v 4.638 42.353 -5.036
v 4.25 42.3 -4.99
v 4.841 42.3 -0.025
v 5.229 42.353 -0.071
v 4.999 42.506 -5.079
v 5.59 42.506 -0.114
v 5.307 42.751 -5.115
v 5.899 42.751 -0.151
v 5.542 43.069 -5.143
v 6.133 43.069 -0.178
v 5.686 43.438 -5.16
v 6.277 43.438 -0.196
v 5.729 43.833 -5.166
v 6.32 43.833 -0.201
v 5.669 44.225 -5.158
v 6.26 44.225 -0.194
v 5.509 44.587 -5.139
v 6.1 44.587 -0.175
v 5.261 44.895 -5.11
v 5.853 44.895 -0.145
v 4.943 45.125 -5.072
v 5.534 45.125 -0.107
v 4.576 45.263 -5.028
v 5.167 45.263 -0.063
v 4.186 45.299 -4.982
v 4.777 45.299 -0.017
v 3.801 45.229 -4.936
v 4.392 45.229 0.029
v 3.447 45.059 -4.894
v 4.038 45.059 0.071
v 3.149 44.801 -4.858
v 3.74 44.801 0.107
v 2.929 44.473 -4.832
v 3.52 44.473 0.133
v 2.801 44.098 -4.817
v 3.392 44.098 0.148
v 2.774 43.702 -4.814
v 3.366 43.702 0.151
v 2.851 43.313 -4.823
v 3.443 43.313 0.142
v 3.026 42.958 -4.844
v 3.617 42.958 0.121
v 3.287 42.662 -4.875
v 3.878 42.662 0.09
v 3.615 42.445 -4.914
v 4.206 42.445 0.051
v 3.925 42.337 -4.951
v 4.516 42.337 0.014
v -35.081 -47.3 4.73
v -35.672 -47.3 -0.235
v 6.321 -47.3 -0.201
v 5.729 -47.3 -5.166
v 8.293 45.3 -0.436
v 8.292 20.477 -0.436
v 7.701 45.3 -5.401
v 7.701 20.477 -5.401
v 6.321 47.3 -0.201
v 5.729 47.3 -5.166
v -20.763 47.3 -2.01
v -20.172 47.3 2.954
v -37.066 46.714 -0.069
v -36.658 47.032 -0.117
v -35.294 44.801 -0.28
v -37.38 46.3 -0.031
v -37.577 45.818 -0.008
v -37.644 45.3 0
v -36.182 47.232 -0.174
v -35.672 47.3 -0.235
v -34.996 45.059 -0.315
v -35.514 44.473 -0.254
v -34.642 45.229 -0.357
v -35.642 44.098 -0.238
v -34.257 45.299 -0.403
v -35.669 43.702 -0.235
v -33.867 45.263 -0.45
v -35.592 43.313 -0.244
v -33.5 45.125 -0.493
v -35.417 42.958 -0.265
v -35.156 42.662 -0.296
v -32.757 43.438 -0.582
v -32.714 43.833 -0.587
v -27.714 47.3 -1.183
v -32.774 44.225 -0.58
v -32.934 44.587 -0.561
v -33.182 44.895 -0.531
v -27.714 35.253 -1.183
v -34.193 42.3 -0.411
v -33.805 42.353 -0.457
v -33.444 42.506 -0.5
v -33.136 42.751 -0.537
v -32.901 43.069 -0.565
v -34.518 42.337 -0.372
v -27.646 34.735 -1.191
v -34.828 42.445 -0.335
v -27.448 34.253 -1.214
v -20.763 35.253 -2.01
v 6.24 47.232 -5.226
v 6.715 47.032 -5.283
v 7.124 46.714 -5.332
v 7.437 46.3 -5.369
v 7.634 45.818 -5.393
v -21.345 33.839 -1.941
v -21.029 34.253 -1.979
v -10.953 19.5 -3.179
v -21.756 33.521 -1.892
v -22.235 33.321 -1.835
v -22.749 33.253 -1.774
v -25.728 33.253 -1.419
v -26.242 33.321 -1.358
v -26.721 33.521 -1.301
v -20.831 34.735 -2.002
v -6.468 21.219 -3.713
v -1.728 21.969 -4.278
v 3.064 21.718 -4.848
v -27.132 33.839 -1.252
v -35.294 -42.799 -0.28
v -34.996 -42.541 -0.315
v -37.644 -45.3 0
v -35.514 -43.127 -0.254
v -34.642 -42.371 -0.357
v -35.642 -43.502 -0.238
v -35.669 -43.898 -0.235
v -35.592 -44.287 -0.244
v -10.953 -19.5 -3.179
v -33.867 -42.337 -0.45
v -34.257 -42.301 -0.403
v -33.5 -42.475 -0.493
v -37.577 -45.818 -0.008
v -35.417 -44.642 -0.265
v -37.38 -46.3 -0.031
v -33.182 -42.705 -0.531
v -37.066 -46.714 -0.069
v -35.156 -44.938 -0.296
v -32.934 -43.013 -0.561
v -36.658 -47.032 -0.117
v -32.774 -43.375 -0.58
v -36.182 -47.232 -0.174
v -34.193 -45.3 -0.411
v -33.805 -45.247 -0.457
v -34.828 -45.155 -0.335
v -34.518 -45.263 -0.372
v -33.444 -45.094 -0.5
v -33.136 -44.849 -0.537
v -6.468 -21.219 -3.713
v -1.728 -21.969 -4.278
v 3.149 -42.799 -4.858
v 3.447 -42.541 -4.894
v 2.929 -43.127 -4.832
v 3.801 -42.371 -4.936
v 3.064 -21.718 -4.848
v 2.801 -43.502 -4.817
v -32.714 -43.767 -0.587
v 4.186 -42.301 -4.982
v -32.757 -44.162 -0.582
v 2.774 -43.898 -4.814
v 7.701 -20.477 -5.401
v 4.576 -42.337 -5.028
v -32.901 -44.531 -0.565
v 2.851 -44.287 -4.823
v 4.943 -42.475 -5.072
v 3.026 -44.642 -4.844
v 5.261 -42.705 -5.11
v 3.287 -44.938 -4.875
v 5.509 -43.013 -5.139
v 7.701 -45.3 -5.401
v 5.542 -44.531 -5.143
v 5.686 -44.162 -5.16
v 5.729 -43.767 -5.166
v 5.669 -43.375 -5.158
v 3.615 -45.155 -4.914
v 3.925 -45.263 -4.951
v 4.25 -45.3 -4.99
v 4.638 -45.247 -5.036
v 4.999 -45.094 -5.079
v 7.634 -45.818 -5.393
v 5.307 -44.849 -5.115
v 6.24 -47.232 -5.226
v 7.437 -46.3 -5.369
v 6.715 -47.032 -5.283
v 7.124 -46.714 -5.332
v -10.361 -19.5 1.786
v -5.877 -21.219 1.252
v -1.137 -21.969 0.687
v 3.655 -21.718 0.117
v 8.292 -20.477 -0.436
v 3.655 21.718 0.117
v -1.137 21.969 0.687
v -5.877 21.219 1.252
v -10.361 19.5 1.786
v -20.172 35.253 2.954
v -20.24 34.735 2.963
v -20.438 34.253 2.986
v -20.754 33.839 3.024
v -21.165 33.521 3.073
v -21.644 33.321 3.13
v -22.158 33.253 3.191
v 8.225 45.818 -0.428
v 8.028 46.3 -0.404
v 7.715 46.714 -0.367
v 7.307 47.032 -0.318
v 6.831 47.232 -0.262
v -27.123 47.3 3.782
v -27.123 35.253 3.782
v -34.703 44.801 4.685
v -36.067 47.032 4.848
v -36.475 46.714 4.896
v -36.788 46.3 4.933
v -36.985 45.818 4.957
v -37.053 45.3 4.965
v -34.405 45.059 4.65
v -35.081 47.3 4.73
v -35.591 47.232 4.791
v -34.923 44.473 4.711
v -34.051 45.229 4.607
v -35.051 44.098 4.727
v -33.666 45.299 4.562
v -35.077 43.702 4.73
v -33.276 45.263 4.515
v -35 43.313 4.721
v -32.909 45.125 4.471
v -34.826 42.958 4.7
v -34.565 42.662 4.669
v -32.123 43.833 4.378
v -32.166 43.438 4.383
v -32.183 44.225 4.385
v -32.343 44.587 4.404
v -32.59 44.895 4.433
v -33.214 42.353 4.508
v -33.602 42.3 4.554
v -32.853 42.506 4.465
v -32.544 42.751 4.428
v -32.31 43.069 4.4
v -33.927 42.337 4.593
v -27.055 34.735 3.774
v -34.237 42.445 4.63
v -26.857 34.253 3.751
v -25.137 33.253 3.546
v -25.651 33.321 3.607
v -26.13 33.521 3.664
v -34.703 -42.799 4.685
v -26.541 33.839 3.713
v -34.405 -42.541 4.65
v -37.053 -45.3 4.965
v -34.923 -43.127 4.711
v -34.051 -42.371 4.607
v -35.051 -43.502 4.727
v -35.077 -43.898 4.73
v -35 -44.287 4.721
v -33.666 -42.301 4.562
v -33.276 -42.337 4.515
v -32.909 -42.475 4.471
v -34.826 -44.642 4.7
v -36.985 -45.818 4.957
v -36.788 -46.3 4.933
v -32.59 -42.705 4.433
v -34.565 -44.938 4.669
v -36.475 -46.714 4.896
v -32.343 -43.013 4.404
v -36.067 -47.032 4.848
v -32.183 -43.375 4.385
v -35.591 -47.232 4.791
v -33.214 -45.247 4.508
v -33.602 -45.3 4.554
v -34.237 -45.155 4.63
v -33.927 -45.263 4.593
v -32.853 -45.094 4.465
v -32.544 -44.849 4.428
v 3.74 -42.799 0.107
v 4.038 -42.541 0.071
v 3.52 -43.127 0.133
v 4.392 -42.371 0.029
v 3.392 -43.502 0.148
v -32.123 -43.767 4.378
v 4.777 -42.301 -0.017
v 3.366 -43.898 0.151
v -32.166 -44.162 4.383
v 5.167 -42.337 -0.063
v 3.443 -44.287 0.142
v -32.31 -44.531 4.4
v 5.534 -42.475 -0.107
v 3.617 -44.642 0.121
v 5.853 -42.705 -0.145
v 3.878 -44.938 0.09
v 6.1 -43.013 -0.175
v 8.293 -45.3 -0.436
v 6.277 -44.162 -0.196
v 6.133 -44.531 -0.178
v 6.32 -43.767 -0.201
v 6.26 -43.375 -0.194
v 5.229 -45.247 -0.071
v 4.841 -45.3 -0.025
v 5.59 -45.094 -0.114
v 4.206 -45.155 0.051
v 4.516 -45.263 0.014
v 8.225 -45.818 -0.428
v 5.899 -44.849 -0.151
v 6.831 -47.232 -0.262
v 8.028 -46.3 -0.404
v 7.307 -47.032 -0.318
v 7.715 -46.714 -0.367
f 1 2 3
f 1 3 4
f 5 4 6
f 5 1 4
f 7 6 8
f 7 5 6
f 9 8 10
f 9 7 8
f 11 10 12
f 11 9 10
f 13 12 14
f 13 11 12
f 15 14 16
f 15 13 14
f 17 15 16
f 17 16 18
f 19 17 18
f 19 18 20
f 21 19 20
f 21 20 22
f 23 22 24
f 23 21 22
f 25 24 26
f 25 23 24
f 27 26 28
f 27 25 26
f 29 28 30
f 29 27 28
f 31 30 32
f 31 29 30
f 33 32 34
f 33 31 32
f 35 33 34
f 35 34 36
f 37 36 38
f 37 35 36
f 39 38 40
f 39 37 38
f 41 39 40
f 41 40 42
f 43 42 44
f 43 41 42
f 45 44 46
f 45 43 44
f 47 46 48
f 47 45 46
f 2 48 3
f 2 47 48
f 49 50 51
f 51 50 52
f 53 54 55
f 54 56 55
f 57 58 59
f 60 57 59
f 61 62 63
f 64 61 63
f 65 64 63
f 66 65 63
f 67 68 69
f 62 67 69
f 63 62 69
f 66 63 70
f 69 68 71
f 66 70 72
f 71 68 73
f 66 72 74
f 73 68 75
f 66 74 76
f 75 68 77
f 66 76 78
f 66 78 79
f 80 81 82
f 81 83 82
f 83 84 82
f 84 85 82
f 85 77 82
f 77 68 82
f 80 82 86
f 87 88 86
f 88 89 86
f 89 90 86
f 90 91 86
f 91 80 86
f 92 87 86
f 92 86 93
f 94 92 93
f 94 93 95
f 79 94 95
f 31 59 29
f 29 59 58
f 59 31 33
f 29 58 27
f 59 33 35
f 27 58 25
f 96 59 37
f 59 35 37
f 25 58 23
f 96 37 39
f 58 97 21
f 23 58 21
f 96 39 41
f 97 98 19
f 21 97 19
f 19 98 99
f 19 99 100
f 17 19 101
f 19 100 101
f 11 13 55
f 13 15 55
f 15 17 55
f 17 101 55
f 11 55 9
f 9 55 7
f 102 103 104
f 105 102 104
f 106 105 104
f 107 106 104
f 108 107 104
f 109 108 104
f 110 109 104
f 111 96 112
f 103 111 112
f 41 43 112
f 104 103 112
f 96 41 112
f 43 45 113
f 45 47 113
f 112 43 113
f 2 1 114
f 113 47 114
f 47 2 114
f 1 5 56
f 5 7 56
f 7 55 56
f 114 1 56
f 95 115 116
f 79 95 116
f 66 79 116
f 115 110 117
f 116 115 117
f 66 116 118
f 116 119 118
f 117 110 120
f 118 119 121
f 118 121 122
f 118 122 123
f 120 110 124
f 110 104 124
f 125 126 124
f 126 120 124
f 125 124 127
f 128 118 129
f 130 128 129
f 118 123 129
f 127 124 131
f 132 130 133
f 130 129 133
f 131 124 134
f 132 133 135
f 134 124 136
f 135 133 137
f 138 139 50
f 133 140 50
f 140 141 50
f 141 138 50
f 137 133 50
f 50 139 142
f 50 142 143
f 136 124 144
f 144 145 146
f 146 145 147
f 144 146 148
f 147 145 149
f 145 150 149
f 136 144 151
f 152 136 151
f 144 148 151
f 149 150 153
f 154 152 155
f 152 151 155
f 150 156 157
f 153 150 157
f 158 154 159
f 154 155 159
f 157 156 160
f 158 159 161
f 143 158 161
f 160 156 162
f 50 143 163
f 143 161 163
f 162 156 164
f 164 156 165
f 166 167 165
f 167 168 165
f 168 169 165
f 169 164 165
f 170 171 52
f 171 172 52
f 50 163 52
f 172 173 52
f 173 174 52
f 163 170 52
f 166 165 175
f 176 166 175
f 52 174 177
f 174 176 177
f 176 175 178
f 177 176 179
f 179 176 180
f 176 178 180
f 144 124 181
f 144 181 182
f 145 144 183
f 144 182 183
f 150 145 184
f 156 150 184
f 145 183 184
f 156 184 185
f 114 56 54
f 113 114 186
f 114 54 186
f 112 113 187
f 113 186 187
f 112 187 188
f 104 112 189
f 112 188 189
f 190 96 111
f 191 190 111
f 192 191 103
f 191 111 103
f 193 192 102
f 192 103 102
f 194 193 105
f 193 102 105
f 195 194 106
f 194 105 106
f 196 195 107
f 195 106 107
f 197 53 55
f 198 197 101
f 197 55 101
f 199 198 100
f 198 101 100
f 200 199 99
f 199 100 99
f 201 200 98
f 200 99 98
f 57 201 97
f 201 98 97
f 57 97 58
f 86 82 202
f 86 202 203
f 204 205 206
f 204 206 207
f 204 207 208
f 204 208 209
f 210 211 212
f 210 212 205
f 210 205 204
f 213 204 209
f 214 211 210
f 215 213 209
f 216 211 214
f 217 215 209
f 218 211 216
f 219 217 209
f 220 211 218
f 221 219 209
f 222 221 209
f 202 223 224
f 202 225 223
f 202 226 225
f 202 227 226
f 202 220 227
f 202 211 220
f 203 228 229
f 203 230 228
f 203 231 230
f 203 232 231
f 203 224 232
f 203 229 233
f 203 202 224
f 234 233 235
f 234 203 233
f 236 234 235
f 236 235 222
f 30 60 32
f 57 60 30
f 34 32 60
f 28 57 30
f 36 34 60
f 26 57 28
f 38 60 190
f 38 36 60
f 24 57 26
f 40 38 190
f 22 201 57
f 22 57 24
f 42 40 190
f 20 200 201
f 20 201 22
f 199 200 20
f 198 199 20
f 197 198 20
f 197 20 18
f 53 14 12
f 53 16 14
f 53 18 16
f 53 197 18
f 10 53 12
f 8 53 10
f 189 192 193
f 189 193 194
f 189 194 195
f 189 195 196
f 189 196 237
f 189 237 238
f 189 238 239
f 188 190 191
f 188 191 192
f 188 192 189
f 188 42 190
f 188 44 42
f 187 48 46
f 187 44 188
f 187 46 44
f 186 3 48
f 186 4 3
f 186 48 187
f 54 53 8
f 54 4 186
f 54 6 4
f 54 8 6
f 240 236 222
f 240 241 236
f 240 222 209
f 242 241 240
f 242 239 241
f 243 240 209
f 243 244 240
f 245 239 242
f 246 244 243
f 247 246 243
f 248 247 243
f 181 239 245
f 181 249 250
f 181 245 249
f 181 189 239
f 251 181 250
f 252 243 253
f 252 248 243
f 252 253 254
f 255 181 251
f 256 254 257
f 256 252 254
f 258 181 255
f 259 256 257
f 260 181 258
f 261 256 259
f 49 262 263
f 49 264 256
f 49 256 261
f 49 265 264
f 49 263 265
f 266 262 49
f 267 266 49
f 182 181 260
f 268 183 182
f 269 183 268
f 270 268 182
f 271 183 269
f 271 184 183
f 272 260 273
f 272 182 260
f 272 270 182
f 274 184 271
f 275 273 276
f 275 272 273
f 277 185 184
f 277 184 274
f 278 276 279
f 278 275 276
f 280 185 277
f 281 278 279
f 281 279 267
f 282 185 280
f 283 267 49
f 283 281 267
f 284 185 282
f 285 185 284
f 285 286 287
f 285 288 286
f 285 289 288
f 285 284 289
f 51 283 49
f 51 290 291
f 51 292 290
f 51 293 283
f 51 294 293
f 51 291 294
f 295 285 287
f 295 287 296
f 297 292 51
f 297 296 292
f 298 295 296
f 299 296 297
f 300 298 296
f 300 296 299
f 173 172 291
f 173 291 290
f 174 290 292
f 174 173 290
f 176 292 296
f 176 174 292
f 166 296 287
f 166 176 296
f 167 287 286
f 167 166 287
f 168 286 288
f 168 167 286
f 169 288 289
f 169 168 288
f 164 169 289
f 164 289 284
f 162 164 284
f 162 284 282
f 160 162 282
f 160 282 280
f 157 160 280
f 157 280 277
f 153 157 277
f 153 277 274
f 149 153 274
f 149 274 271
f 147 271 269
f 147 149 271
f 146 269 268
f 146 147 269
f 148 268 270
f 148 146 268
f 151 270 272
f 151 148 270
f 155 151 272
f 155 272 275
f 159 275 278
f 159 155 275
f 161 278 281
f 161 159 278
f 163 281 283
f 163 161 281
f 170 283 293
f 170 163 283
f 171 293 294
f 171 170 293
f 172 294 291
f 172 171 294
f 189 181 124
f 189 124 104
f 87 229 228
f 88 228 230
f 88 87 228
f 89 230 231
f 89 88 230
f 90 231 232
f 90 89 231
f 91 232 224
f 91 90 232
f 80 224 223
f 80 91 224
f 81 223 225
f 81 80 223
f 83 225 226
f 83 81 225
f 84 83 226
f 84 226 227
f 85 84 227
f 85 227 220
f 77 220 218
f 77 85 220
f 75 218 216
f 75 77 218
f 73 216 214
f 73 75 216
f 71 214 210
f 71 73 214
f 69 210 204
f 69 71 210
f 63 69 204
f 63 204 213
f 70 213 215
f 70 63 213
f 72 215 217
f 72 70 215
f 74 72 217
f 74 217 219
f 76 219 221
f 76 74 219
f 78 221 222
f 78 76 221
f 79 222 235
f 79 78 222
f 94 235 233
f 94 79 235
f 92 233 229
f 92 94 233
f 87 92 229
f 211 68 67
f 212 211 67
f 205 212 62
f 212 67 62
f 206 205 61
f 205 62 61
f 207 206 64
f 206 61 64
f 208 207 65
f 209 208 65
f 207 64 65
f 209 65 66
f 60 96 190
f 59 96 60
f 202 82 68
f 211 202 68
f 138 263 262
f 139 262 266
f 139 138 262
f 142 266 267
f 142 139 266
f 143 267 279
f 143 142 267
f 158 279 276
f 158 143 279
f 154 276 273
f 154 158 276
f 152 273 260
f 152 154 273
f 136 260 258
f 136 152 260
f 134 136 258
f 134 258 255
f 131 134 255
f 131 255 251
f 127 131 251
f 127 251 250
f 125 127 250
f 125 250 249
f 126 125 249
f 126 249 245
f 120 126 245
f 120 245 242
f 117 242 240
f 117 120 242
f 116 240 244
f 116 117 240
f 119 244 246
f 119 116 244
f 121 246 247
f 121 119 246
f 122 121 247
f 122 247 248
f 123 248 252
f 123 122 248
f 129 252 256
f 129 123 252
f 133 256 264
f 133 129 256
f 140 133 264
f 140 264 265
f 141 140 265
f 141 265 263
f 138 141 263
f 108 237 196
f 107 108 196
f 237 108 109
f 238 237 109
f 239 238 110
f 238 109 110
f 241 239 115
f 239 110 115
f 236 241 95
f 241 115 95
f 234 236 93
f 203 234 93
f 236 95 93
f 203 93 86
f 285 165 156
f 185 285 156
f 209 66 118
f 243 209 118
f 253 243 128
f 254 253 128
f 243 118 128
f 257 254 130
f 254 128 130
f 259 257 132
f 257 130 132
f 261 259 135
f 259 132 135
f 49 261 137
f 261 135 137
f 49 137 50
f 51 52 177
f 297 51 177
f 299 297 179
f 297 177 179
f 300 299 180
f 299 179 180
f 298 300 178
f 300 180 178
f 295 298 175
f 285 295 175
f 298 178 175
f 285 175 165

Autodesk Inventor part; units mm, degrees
ref_plane "YZ Plane" through (0, 0, 0) normal (1, 0, 0) x (0, 1, 0)
ref_plane "XZ Plane" through (0, 0, 0) normal (0, 1, 0) x (-1, 0, 0)
ref_plane "XY Plane" through (0, 0, 0) normal (0, 0, 1) x (1, 0, 0)
ref_plane "Work Plane1" through (-27.4782, 47.3, -1.2107) normal (0.118263, 0, 0.9929823) x (0, -1, 0)
sketch "Sketch1" plane through (-27.4782, 47.3, -1.2107) normal (0.118263, 0, 0.9929823) x (0, -1, 0)
  line L0 (0, 33.4421) -> (0, -8.2516) projected
  line L1 (2, -10.2376) -> (92.6, -10.2376) projected
  line L2 (94.6, -8.2516) -> (94.6, 33.4421) projected
  line L3 (92.6, 35.428) -> (2, 35.428) projected
  line L4 (7, -3.2867) -> (7, 28.4771) projected
  line L5 (7, 28.4771) -> (87.6, 28.4771) projected
  line L6 (87.6, 28.4771) -> (87.6, -3.2867) projected
  line L7 (87.6, -3.2867) -> (7, -3.2867) projected
  ellipse E0 centre (2, 33.4421) end of major axis (4, 33.4421) minor radius 1.986 (2, 35.428) -> (0, 33.4421) ccw projected
  ellipse E1 centre (2, -8.2516) end of major axis (0, -8.2516) minor radius 1.986 (0, -8.2516) -> (2, -10.2376) ccw projected
  ellipse E2 centre (92.6, -8.2516) end of major axis (90.6, -8.2516) minor radius 1.986 (92.6, -10.2376) -> (94.6, -8.2516) ccw projected
  ellipse E3 centre (92.6, 33.4421) end of major axis (94.6, 33.4421) minor radius 1.986 (94.6, 33.4421) -> (92.6, 35.428) ccw projected
  ellipse E4 centre (91.1, -6.7621) end of major axis (92.6, -6.7621) minor radius 1.4895 projected
  ellipse E5 centre (3.5, -6.7621) end of major axis (5, -6.7621) minor radius 1.4895 projected
  ellipse E6 centre (91.1, 31.9526) end of major axis (92.6, 31.9526) minor radius 1.4895 projected
  ellipse E7 centre (3.5, 31.9526) end of major axis (5, 31.9526) minor radius 1.4895 projected
  point P0 (47.3, 27.1422)
extrude "Extrusion1" add sketch "Sketch1" along normal blind 5 contours E0 L3 E3 L2 E2 L1 E1 L0 | L4 L5 L6 L7
sketch "Sketch2" plane through (-26.8869, 47.3, 3.7542) normal (0.118263, 0, 0.9929823) x (0.9929823, 0, -0.118263)
  line L0 (16.6422, -25.3) -> (37.6422, -25.3)
  line L1 (37.6422, -25.3) -> (37.6422, -69.3)
  line L2 (37.6422, -69.3) -> (16.6422, -69.3)
  line L3 (16.6422, -69.3) -> (16.6422, -25.3)
  line L4 (16.6422, -25.3) -> (37.6422, -69.3) construction
  line L5 (37.6422, -25.3) -> (16.6422, -69.3) construction
  line L6 (37.6422, -27.8) -> (16.6422, -27.8)
  arc A0 (37.6422, -27.8) -> (16.6422, -27.8) centre (27.1422, -48.6) ccw
  line L7 (33.4421, 0) -> (-8.2516, 0) projected
  arc A1 (-8.2516, 0) -> (-10.2376, -2) centre (2, -2) ccw projected
  line L8 (-10.2376, -2) -> (-10.2376, -92.6) projected
  arc A2 (-10.2376, -92.6) -> (-8.2516, -94.6) centre (2, -92.6) ccw projected
  line L9 (-8.2516, -94.6) -> (33.4421, -94.6) projected
  arc A3 (33.4421, -94.6) -> (35.428, -92.6) centre (45.9099, -92.6) ccw projected
  line L10 (35.428, -92.6) -> (35.428, -2) projected
  arc A4 (35.428, -2) -> (33.4421, 0) centre (45.9099, -2) ccw projected
  circle A5 centre (44.4099, -3.5) radius 1.5 projected
  circle A6 centre (44.4099, -91.1) radius 1.5 projected
  circle A7 centre (3.5, -3.5) radius 1.5 projected
  circle A8 centre (3.5, -91.1) radius 1.5 projected
  line L11 (35.428, -47.3) -> (-10.2376, -47.3)
  line L12 (-10.2376, -2) -> (-10.2376, -92.6) projected
  arc A9 (16.6422, -66.8) -> (37.6422, -66.8) centre (27.1422, -46) ccw
  point P0 (27.1422, -47.3)
  point P1 (27.1422, -25.3)
  point P2 (16.6422, -66.8)
  point P3 (37.6422, -66.8)
  dimension "d2" = 21
  dimension "d3" = 44
  dimension "d4" = 2.5
extrude "Extrusion2" cut sketch "Sketch2" against normal through all contours A0 L10 L6 | L6 L10 L11 L3 | A0 L6 L10 | L11 L10 A9 L3 | L6 L1 A9 L10
sketch "Sketch3" plane through (-27.4782, 47.3, -1.2107) normal (-0.118263, 0, -0.9929823) x (-0.9929823, 0, 0.118263)
  arc A0 (-35.428, -67.7769) -> (-16.6422, -66.8) centre (-27.1422, -46) ccw projected
  arc A1 (-16.6422, -27.8) -> (-35.428, -26.8231) centre (-27.1422, -48.6) ccw projected
  line L0 (-16.6422, -27.8) -> (-16.6422, -66.8) projected
  line L1 (-33.4421, 0) -> (8.2516, 0) projected
  arc A2 (-33.4421, 0) -> (-35.428, -2) centre (-45.9099, -2) ccw projected
  line L2 (-35.428, -92.6) -> (-35.428, -67.7769) projected
  arc A3 (-35.428, -92.6) -> (-33.4421, -94.6) centre (-45.9099, -92.6) ccw projected
  line L3 (8.2516, -94.6) -> (-33.4421, -94.6) projected
  arc A4 (8.2516, -94.6) -> (10.2376, -92.6) centre (-2, -92.6) ccw projected
  line L4 (10.2376, -2) -> (10.2376, -92.6) projected
  arc A5 (10.2376, -2) -> (8.2516, 0) centre (-2, -2) ccw projected
  circle A6 centre (-44.4099, -3.5) radius 1.5 projected
  circle A7 centre (-44.4099, -91.1) radius 1.5 projected
  circle A8 centre (-3.5, -3.5) radius 1.5 projected
  circle A9 centre (-3.5, -91.1) radius 1.5 projected
  line L5 (-6.7624, 0) -> (0.2376, 0)
  line L6 (0.2376, 0) -> (0.2376, -12.0472)
  line L7 (-1.7624, -14.0472) -> (-4.7624, -14.0472)
  line L8 (-6.7624, -12.0472) -> (-6.7624, 0)
  arc A10 (-6.7624, -12.0472) -> (-4.7624, -14.0472) centre (-4.7624, -12.0472) ccw
  arc A11 (-1.7624, -14.0472) -> (0.2376, -12.0472) centre (-1.7624, -12.0472) ccw
  line L9 (0.2376, -7) -> (-6.7624, -7)
  line L10 (-35.428, -26.8231) -> (-35.428, -2) projected
  point P0 (-27.1422, -47.3)
  point P1 (0.2376, -14.0472)
  point P2 (-6.7624, -14.0472)
  point P3 (0.2376, 0)
  dimension "d7" = 7
  dimension "d9" = 2
  dimension "d12" = 10
  dimension "d13" = 7
extrude "Extrusion3" cut sketch "Sketch3" against normal through all contours L1 L6 L9 L8 | L9 L6 A11 L7 A10 L8 | A8
properties part number "TAPA_CAMARA_2"
